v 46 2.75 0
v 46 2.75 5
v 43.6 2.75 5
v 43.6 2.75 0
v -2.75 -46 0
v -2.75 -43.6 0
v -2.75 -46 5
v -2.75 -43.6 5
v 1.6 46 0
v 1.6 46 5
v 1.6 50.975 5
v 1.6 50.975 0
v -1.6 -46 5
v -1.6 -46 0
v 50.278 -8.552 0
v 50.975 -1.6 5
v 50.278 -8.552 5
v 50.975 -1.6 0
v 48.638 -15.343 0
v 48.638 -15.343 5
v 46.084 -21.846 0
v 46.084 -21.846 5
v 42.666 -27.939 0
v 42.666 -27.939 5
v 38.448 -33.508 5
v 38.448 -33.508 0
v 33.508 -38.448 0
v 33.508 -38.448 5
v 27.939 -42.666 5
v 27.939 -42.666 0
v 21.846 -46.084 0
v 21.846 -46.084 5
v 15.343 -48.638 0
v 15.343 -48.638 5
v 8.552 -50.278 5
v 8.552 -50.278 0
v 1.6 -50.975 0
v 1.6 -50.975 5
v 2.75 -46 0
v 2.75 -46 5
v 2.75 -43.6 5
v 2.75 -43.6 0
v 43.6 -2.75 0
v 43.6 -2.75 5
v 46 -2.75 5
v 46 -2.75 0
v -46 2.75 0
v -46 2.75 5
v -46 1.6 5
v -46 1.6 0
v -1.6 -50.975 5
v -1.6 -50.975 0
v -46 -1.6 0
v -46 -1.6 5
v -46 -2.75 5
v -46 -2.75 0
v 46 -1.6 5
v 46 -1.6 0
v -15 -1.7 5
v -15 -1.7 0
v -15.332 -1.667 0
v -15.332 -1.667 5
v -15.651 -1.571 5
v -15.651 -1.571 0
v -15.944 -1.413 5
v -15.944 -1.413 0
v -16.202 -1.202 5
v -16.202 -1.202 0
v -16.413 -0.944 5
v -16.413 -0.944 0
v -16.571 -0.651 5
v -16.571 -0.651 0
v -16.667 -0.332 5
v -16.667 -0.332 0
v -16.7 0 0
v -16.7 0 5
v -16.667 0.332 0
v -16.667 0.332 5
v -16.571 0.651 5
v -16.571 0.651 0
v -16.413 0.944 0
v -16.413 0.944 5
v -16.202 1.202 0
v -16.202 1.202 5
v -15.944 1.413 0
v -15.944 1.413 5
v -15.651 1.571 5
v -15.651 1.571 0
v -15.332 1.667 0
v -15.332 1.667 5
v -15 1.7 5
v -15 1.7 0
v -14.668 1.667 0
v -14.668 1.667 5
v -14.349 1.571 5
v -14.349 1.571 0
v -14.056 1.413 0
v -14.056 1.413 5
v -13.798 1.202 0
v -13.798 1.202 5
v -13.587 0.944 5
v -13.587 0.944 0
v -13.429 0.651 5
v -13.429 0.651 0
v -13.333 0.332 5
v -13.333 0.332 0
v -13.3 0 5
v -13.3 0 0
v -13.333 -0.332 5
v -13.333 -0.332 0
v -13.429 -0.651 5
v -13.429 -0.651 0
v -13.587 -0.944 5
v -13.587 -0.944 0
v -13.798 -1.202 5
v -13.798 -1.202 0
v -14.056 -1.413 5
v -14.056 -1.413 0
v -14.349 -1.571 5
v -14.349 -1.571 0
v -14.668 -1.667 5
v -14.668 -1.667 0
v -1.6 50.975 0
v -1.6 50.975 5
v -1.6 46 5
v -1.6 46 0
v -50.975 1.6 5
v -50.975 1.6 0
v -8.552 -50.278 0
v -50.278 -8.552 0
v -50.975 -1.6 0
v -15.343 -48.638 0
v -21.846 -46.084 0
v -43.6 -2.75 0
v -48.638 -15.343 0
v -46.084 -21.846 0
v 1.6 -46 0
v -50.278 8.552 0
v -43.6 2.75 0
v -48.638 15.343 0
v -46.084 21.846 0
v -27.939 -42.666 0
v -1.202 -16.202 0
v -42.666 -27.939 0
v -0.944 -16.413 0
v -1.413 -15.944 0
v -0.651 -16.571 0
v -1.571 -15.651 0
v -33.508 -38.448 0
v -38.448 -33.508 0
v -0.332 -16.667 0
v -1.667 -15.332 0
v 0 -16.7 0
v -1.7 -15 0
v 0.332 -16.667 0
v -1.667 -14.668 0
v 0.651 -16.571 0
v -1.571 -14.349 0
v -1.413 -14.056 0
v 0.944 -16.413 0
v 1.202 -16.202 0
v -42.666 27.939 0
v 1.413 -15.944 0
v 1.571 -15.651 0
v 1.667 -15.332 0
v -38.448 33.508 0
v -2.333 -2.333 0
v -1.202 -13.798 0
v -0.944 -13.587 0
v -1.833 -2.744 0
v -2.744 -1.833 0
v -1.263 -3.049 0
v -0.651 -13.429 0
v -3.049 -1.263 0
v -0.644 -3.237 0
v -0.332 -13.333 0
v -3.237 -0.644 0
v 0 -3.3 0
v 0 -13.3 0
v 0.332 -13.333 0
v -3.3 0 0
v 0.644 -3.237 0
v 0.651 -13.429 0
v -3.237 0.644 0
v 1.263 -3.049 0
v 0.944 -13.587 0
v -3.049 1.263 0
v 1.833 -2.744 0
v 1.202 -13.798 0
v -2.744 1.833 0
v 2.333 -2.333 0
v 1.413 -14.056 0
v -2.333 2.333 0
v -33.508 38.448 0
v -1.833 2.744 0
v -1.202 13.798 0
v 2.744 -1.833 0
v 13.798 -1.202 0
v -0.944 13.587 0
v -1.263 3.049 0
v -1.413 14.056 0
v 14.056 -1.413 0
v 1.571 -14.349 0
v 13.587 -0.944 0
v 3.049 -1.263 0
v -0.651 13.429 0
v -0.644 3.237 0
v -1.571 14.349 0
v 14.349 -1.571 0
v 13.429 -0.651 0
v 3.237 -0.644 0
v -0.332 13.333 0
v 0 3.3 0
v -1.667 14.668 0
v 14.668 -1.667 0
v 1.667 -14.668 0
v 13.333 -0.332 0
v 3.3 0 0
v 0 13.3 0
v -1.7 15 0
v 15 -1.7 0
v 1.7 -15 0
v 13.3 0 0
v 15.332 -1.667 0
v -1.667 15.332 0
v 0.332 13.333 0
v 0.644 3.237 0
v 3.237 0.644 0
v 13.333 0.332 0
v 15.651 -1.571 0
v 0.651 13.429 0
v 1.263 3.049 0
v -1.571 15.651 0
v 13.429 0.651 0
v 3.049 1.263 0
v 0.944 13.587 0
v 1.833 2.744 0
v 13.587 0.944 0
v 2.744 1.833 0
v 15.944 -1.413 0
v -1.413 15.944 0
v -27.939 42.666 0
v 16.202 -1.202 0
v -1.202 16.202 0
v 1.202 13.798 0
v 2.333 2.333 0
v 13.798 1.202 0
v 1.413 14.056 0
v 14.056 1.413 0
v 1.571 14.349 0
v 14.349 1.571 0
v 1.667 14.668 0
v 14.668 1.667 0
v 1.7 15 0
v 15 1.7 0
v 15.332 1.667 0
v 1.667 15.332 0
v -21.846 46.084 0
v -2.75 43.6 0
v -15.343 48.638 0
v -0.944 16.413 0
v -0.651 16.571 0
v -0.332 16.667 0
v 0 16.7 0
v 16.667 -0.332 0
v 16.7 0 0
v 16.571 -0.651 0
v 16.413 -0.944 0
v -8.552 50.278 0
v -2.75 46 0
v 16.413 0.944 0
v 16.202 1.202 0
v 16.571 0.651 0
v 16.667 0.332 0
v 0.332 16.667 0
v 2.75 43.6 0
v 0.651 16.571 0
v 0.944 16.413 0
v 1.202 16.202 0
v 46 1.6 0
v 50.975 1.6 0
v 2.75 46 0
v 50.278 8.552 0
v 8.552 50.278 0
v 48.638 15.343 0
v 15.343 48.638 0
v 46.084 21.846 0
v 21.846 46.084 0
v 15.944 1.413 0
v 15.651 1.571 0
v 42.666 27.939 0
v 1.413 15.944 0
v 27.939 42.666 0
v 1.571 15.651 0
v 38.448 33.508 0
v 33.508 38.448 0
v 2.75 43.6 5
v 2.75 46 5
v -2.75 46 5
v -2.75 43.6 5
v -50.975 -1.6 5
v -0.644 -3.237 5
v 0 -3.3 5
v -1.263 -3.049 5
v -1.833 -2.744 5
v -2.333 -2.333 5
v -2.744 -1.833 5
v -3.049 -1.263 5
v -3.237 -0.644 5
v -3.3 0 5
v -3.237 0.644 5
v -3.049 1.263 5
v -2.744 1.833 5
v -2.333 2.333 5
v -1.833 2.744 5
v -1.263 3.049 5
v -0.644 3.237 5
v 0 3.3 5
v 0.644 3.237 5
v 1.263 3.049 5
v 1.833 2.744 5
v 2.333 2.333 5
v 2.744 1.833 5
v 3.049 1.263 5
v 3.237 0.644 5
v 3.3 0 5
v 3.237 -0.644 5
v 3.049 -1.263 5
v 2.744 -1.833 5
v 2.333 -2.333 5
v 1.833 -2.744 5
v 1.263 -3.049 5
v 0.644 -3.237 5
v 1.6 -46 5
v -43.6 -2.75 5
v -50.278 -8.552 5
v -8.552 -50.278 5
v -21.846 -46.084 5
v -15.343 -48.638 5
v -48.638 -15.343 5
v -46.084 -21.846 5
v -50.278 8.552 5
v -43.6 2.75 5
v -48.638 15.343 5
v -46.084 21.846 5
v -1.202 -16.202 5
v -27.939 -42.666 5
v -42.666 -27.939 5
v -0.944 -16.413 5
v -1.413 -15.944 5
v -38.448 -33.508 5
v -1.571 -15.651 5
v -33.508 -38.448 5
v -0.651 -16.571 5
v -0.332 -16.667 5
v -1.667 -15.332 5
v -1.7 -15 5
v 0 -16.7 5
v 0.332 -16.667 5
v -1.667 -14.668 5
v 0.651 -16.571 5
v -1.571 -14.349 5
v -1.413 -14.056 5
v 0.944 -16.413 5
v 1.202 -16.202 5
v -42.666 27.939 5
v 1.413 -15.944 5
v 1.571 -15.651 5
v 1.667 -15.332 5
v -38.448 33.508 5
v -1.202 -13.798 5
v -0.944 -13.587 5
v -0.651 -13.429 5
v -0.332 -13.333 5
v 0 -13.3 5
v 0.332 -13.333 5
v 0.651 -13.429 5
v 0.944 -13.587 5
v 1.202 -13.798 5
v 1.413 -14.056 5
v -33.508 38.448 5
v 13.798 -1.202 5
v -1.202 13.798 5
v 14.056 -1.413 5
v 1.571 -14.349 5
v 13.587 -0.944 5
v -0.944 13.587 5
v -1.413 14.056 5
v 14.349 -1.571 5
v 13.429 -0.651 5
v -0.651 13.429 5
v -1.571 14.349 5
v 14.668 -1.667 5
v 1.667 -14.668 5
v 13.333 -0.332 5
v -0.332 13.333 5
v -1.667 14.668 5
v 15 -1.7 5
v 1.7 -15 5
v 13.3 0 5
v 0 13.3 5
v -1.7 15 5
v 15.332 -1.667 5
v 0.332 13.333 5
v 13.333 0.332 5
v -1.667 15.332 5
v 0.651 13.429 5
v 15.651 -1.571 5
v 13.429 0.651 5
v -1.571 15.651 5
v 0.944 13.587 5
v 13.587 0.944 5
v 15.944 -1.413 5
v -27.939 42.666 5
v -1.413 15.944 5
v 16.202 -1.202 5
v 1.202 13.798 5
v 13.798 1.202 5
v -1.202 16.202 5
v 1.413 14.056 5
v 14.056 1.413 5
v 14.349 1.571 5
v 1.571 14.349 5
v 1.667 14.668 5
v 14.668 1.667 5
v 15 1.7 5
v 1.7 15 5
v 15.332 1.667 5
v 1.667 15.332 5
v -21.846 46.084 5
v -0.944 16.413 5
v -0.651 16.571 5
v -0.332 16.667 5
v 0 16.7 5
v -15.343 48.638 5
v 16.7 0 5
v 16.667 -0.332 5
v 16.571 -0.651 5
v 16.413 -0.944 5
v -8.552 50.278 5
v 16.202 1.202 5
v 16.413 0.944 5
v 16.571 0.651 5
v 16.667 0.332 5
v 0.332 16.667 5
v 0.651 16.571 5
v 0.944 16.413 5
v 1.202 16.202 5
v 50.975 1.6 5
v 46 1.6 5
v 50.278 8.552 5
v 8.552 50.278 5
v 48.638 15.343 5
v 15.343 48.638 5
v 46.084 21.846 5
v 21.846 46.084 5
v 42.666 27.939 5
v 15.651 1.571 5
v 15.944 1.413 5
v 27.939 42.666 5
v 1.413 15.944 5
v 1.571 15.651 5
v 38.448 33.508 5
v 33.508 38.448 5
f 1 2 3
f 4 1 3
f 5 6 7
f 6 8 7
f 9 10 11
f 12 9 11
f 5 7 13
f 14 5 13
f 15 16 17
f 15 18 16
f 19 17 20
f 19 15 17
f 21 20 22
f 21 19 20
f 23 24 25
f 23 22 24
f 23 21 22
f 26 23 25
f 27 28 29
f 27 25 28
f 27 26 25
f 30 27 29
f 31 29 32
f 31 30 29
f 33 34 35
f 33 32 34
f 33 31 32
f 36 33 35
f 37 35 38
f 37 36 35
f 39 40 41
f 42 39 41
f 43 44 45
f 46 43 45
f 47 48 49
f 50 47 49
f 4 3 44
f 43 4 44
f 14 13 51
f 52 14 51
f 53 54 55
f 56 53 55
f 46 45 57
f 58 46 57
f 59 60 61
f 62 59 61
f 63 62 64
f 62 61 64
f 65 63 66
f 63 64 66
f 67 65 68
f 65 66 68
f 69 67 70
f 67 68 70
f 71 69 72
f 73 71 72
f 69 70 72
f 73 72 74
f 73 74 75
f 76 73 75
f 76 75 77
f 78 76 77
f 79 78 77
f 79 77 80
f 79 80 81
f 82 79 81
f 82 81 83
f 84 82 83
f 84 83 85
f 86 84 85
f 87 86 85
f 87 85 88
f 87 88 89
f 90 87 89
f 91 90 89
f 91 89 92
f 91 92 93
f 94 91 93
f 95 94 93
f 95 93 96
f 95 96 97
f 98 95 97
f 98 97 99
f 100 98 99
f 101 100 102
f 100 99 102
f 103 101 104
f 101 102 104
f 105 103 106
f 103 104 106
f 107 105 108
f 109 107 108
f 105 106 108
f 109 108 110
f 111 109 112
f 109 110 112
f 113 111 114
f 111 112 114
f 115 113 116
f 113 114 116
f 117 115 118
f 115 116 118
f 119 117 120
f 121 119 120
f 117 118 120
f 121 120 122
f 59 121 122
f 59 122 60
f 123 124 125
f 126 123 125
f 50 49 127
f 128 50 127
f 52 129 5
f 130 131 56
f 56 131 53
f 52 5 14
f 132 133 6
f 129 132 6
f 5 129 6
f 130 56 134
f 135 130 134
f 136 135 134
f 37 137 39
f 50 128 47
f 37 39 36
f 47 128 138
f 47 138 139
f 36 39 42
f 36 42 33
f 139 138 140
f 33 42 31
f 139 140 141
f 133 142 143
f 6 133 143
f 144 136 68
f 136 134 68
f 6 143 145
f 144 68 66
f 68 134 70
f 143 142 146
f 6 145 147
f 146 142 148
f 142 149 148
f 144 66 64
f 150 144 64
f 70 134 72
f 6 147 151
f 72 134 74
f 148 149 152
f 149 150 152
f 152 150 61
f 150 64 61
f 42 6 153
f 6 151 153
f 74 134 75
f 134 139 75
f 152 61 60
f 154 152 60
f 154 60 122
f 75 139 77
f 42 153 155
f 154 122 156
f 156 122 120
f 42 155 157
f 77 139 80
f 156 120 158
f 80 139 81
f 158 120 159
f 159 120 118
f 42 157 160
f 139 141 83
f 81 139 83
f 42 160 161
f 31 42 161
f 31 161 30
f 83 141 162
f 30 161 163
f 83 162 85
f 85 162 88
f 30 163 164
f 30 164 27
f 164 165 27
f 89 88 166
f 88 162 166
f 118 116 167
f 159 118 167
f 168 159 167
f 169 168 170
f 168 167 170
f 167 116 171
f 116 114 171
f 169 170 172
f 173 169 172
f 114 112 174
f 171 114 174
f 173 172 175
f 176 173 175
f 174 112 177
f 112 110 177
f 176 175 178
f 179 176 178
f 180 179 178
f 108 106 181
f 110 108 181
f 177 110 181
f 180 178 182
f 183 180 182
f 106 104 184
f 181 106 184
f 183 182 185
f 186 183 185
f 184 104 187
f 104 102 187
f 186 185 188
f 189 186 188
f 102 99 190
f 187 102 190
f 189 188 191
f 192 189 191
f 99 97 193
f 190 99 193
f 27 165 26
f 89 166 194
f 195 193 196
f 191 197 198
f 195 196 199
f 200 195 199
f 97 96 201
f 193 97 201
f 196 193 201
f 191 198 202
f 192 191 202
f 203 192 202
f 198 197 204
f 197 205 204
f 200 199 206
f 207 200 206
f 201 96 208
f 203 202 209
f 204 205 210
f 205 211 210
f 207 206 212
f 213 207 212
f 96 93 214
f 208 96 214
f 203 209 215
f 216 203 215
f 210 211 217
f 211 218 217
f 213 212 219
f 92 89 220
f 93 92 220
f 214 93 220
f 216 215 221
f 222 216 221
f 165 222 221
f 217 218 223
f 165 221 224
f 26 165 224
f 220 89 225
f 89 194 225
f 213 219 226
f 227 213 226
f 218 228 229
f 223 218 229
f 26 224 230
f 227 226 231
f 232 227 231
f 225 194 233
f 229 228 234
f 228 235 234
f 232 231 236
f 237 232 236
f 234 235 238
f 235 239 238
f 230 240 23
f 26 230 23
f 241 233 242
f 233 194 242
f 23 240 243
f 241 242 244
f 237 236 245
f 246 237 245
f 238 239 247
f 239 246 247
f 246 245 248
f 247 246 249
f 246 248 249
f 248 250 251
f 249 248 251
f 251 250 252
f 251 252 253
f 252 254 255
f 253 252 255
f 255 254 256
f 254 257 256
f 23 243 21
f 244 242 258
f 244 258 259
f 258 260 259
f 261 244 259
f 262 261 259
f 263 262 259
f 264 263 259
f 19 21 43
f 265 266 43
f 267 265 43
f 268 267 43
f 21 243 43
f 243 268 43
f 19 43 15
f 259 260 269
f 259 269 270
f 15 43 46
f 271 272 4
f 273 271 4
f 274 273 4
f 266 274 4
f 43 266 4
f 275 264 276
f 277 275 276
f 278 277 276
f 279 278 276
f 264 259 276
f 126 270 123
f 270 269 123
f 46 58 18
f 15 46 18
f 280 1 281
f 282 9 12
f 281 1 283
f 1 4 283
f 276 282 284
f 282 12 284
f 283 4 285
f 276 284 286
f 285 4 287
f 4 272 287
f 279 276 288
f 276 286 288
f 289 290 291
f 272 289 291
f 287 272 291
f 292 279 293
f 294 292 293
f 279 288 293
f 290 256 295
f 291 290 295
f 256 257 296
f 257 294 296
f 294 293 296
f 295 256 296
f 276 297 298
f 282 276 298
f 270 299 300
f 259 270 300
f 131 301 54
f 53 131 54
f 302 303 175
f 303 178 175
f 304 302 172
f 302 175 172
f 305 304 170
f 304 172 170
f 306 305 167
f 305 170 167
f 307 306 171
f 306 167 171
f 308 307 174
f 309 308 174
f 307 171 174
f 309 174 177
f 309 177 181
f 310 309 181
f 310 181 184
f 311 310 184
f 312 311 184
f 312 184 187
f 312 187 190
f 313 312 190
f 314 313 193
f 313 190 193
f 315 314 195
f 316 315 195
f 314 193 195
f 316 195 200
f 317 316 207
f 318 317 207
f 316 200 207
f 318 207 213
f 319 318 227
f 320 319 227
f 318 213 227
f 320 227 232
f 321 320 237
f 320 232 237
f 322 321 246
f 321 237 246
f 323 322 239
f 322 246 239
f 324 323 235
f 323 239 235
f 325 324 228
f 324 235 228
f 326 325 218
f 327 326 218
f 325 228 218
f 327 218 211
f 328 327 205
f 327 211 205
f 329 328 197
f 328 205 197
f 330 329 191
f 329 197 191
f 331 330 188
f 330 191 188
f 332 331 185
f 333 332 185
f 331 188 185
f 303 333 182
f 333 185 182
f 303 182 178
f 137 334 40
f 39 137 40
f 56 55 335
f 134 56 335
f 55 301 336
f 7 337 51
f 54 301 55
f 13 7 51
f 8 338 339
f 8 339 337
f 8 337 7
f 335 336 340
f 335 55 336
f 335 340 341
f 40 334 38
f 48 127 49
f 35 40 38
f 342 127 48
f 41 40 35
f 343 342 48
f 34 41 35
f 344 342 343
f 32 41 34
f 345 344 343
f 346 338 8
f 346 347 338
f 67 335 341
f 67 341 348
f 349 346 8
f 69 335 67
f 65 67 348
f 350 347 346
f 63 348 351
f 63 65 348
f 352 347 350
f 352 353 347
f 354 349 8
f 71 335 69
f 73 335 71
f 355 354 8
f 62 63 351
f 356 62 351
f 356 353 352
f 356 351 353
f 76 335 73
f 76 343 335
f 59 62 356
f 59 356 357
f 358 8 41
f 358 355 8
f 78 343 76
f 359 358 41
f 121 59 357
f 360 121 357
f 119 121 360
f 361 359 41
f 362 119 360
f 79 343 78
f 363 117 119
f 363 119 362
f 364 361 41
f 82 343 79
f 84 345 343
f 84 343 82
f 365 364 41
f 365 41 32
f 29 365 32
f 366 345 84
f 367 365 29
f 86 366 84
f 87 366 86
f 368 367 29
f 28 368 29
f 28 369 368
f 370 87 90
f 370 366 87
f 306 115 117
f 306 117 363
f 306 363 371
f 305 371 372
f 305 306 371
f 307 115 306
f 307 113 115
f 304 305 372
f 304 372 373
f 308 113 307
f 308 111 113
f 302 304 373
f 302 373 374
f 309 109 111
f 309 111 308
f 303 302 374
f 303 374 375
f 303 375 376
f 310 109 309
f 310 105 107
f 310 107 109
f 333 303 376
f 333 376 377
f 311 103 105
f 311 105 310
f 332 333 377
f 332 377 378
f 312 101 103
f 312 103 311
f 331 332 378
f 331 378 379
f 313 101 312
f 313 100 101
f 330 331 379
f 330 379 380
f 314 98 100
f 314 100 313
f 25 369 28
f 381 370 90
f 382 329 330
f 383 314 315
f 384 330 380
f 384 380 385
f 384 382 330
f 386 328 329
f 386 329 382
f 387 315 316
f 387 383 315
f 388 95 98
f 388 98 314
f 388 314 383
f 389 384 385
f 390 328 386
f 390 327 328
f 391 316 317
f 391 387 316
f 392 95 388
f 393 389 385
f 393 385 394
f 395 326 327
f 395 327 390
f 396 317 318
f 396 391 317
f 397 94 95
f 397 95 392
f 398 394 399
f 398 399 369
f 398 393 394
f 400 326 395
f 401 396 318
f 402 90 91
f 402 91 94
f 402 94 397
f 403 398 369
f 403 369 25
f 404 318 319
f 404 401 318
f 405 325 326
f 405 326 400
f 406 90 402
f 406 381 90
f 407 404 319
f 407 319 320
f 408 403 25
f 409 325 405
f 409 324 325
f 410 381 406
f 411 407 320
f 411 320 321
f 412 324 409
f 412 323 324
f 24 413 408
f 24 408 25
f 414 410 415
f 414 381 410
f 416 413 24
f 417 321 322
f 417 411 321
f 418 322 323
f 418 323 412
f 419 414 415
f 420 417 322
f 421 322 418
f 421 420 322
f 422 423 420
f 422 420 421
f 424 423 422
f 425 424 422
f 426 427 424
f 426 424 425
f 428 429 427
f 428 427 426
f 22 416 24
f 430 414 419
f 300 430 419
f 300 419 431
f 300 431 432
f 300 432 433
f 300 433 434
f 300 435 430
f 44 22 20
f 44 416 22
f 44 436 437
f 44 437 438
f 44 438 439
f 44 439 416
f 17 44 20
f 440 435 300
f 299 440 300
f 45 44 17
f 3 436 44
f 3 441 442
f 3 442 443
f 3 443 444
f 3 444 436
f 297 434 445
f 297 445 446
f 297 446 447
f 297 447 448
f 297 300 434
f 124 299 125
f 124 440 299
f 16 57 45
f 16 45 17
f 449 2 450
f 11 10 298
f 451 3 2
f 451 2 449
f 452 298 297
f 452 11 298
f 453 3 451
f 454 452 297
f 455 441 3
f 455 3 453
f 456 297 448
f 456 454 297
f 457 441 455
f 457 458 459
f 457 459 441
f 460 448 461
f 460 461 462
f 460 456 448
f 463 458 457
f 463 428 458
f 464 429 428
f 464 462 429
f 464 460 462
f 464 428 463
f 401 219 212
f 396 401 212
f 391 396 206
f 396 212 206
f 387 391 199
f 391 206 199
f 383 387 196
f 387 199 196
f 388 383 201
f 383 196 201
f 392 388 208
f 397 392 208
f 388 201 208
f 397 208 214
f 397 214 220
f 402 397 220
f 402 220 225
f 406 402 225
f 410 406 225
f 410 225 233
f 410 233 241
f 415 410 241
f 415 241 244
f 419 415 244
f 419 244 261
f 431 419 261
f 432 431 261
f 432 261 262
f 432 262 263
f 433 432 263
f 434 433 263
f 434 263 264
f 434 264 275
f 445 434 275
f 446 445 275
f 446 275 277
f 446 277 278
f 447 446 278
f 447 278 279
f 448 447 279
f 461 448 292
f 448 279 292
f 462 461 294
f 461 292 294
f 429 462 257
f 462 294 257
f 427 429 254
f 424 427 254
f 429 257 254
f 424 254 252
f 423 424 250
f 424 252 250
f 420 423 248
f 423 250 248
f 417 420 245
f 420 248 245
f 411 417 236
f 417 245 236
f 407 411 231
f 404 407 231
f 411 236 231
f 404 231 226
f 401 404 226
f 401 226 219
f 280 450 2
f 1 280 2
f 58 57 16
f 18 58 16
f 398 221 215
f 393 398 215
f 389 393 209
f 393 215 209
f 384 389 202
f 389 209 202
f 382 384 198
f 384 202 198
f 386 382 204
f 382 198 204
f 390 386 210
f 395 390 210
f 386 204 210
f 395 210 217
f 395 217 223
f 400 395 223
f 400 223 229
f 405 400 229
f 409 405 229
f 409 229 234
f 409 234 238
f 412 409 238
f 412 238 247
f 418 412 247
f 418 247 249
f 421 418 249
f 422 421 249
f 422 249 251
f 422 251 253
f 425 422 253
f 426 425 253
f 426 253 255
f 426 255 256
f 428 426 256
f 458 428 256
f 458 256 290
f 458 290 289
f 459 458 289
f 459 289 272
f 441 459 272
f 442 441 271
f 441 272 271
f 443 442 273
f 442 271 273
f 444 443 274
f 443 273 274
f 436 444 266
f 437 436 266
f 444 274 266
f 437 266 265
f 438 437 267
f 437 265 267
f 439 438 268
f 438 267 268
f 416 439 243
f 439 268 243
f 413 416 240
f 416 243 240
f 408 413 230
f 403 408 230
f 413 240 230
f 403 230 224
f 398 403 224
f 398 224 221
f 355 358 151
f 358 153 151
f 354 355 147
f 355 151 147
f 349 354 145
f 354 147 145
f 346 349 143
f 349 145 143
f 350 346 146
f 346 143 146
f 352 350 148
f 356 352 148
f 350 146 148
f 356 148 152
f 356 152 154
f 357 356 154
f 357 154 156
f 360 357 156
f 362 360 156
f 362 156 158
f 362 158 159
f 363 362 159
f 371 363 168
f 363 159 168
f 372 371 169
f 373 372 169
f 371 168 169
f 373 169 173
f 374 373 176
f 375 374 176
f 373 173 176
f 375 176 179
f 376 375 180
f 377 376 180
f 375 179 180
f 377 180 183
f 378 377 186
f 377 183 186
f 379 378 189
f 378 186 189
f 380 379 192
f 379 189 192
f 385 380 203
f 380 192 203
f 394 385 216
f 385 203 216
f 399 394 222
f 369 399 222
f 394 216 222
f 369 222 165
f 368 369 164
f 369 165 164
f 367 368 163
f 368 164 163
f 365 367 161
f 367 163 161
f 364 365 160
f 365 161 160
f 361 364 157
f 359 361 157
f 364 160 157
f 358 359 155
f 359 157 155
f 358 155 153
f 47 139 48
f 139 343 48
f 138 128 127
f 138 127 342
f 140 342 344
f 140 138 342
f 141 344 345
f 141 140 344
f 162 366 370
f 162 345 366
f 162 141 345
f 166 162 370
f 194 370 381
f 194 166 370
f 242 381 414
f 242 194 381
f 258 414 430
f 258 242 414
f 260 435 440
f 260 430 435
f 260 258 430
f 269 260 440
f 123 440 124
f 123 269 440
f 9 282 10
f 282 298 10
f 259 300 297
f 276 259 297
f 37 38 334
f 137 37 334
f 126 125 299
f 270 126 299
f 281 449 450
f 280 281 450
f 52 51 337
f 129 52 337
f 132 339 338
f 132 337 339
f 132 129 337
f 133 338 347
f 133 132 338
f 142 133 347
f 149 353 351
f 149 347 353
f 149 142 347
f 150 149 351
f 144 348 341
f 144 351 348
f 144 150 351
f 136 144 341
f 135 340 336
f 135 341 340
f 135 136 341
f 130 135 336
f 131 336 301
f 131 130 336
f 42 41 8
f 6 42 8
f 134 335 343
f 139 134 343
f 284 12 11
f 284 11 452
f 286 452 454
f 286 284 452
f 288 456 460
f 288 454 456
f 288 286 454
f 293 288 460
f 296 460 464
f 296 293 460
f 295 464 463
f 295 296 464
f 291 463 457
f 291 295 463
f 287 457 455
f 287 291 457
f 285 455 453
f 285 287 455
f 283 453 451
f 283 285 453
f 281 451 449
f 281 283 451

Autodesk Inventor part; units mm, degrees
ref_plane "YZ Plane" through (0, 0, 0) normal (1, 0, 0) x (0, 1, 0)
ref_plane "XZ Plane" through (0, 0, 0) normal (0, 1, 0) x (-1, 0, 0)
ref_plane "XY Plane" through (0, 0, 0) normal (0, 0, 1) x (1, 0, 0)
sketch "Sketch1" plane through (0, 0, 0) normal (0, 0, 1) x (1, 0, 0)
  circle A0 centre (0, 0) radius 51
  dimension "d0" = 102
extrude "Extrusion1" add sketch "Sketch1" along normal blind 5
sketch "Sketch2" plane through (0, 0, 5) normal (0, 0, 1) x (1, 0, 0)
  point P0 (0, 0)
  point P1 (0, 0)
hole "Hole1" at (0, 0, 5) direction (0, 0, -1) diameter 6.6 depth 8 tip angle 118 clearance for "Countersunk Flat Head Screw DIN EN ISO 2009" size "M6" standard "DIN"
sketch "Sketch3" plane through (0, 0, 5) normal (0, 0, 1) x (1, 0, 0)
  circle A0 centre (0, 0) radius 15 construction
  point P0 (-15, 0)
  point P1 (0, 15)
  point P2 (15, 0)
  point P3 (0, -15)
  dimension "d10" = 30
hole "Hole2" at (-15, 0, 5) at (0, 15, 5) at (15, 0, 5) at (0, -15, 5) direction (0, 0, -1) diameter 3.4 depth 8 tip angle 118 clearance for "Countersunk Flat Head Screw DIN EN ISO 2009" size "M3" standard "DIN"
sketch "Sketch4" plane through (0, 0, 5) normal (0, 0, 1) x (1, 0, 0)
  line L0 (-51, 1.6) -> (-51, -1.6)
  line L1 (-51, -1.6) -> (-46, -1.6)
  line L2 (-46, -1.6) -> (-46, -2.75)
  line L3 (-46, -2.75) -> (-43.6, -2.75)
  line L4 (-43.6, -2.75) -> (-43.6, 2.75)
  line L5 (-43.6, 2.75) -> (-46, 2.75)
  line L6 (-46, 2.75) -> (-46, 1.6)
  line L7 (-46, 1.6) -> (-51, 1.6)
  line L8 (-1.6, -51) -> (1.6, -51)
  line L9 (1.6, -51) -> (1.6, -46)
  line L10 (1.6, -46) -> (2.75, -46)
  line L11 (2.75, -46) -> (2.75, -43.6)
  line L12 (2.75, -43.6) -> (-2.75, -43.6)
  line L13 (-2.75, -43.6) -> (-2.75, -46)
  line L14 (-2.75, -46) -> (-1.6, -46)
  line L15 (-1.6, -46) -> (-1.6, -51)
  line L16 (51, -1.6) -> (51, 1.6)
  line L17 (51, 1.6) -> (46, 1.6)
  line L18 (46, 1.6) -> (46, 2.75)
  line L19 (46, 2.75) -> (43.6, 2.75)
  line L20 (43.6, 2.75) -> (43.6, -2.75)
  line L21 (43.6, -2.75) -> (46, -2.75)
  line L22 (46, -2.75) -> (46, -1.6)
  line L23 (46, -1.6) -> (51, -1.6)
  line L24 (1.6, 51) -> (-1.6, 51)
  line L25 (-1.6, 51) -> (-1.6, 46)
  line L26 (-1.6, 46) -> (-2.75, 46)
  line L27 (-2.75, 46) -> (-2.75, 43.6)
  line L28 (-2.75, 43.6) -> (2.75, 43.6)
  line L29 (2.75, 43.6) -> (2.75, 46)
  line L30 (2.75, 46) -> (1.6, 46)
  line L31 (1.6, 46) -> (1.6, 51)
  point P0 (0, 0)
  point P1 (-43.6, 0)
  point P2 (-51, 0)
  point P3 (0, -51)
  point P4 (0, -43.6)
  point P5 (51, 0)
  point P6 (43.6, 0)
  point P7 (0, 51)
  point P8 (0, 43.6)
  dimension "d18" = 5.5
  dimension "d19" = 5
  dimension "d20" = 2.4
  dimension "d21" = 3.2
  dimension "d22" = 51
  dimension "d25" = 360
extrude "Extrusion2" cut sketch "Sketch4" against normal through all
equation "\"d27\" = d22"
properties part number "PlexiHalter2" material "Polycarbonate, Clear"
